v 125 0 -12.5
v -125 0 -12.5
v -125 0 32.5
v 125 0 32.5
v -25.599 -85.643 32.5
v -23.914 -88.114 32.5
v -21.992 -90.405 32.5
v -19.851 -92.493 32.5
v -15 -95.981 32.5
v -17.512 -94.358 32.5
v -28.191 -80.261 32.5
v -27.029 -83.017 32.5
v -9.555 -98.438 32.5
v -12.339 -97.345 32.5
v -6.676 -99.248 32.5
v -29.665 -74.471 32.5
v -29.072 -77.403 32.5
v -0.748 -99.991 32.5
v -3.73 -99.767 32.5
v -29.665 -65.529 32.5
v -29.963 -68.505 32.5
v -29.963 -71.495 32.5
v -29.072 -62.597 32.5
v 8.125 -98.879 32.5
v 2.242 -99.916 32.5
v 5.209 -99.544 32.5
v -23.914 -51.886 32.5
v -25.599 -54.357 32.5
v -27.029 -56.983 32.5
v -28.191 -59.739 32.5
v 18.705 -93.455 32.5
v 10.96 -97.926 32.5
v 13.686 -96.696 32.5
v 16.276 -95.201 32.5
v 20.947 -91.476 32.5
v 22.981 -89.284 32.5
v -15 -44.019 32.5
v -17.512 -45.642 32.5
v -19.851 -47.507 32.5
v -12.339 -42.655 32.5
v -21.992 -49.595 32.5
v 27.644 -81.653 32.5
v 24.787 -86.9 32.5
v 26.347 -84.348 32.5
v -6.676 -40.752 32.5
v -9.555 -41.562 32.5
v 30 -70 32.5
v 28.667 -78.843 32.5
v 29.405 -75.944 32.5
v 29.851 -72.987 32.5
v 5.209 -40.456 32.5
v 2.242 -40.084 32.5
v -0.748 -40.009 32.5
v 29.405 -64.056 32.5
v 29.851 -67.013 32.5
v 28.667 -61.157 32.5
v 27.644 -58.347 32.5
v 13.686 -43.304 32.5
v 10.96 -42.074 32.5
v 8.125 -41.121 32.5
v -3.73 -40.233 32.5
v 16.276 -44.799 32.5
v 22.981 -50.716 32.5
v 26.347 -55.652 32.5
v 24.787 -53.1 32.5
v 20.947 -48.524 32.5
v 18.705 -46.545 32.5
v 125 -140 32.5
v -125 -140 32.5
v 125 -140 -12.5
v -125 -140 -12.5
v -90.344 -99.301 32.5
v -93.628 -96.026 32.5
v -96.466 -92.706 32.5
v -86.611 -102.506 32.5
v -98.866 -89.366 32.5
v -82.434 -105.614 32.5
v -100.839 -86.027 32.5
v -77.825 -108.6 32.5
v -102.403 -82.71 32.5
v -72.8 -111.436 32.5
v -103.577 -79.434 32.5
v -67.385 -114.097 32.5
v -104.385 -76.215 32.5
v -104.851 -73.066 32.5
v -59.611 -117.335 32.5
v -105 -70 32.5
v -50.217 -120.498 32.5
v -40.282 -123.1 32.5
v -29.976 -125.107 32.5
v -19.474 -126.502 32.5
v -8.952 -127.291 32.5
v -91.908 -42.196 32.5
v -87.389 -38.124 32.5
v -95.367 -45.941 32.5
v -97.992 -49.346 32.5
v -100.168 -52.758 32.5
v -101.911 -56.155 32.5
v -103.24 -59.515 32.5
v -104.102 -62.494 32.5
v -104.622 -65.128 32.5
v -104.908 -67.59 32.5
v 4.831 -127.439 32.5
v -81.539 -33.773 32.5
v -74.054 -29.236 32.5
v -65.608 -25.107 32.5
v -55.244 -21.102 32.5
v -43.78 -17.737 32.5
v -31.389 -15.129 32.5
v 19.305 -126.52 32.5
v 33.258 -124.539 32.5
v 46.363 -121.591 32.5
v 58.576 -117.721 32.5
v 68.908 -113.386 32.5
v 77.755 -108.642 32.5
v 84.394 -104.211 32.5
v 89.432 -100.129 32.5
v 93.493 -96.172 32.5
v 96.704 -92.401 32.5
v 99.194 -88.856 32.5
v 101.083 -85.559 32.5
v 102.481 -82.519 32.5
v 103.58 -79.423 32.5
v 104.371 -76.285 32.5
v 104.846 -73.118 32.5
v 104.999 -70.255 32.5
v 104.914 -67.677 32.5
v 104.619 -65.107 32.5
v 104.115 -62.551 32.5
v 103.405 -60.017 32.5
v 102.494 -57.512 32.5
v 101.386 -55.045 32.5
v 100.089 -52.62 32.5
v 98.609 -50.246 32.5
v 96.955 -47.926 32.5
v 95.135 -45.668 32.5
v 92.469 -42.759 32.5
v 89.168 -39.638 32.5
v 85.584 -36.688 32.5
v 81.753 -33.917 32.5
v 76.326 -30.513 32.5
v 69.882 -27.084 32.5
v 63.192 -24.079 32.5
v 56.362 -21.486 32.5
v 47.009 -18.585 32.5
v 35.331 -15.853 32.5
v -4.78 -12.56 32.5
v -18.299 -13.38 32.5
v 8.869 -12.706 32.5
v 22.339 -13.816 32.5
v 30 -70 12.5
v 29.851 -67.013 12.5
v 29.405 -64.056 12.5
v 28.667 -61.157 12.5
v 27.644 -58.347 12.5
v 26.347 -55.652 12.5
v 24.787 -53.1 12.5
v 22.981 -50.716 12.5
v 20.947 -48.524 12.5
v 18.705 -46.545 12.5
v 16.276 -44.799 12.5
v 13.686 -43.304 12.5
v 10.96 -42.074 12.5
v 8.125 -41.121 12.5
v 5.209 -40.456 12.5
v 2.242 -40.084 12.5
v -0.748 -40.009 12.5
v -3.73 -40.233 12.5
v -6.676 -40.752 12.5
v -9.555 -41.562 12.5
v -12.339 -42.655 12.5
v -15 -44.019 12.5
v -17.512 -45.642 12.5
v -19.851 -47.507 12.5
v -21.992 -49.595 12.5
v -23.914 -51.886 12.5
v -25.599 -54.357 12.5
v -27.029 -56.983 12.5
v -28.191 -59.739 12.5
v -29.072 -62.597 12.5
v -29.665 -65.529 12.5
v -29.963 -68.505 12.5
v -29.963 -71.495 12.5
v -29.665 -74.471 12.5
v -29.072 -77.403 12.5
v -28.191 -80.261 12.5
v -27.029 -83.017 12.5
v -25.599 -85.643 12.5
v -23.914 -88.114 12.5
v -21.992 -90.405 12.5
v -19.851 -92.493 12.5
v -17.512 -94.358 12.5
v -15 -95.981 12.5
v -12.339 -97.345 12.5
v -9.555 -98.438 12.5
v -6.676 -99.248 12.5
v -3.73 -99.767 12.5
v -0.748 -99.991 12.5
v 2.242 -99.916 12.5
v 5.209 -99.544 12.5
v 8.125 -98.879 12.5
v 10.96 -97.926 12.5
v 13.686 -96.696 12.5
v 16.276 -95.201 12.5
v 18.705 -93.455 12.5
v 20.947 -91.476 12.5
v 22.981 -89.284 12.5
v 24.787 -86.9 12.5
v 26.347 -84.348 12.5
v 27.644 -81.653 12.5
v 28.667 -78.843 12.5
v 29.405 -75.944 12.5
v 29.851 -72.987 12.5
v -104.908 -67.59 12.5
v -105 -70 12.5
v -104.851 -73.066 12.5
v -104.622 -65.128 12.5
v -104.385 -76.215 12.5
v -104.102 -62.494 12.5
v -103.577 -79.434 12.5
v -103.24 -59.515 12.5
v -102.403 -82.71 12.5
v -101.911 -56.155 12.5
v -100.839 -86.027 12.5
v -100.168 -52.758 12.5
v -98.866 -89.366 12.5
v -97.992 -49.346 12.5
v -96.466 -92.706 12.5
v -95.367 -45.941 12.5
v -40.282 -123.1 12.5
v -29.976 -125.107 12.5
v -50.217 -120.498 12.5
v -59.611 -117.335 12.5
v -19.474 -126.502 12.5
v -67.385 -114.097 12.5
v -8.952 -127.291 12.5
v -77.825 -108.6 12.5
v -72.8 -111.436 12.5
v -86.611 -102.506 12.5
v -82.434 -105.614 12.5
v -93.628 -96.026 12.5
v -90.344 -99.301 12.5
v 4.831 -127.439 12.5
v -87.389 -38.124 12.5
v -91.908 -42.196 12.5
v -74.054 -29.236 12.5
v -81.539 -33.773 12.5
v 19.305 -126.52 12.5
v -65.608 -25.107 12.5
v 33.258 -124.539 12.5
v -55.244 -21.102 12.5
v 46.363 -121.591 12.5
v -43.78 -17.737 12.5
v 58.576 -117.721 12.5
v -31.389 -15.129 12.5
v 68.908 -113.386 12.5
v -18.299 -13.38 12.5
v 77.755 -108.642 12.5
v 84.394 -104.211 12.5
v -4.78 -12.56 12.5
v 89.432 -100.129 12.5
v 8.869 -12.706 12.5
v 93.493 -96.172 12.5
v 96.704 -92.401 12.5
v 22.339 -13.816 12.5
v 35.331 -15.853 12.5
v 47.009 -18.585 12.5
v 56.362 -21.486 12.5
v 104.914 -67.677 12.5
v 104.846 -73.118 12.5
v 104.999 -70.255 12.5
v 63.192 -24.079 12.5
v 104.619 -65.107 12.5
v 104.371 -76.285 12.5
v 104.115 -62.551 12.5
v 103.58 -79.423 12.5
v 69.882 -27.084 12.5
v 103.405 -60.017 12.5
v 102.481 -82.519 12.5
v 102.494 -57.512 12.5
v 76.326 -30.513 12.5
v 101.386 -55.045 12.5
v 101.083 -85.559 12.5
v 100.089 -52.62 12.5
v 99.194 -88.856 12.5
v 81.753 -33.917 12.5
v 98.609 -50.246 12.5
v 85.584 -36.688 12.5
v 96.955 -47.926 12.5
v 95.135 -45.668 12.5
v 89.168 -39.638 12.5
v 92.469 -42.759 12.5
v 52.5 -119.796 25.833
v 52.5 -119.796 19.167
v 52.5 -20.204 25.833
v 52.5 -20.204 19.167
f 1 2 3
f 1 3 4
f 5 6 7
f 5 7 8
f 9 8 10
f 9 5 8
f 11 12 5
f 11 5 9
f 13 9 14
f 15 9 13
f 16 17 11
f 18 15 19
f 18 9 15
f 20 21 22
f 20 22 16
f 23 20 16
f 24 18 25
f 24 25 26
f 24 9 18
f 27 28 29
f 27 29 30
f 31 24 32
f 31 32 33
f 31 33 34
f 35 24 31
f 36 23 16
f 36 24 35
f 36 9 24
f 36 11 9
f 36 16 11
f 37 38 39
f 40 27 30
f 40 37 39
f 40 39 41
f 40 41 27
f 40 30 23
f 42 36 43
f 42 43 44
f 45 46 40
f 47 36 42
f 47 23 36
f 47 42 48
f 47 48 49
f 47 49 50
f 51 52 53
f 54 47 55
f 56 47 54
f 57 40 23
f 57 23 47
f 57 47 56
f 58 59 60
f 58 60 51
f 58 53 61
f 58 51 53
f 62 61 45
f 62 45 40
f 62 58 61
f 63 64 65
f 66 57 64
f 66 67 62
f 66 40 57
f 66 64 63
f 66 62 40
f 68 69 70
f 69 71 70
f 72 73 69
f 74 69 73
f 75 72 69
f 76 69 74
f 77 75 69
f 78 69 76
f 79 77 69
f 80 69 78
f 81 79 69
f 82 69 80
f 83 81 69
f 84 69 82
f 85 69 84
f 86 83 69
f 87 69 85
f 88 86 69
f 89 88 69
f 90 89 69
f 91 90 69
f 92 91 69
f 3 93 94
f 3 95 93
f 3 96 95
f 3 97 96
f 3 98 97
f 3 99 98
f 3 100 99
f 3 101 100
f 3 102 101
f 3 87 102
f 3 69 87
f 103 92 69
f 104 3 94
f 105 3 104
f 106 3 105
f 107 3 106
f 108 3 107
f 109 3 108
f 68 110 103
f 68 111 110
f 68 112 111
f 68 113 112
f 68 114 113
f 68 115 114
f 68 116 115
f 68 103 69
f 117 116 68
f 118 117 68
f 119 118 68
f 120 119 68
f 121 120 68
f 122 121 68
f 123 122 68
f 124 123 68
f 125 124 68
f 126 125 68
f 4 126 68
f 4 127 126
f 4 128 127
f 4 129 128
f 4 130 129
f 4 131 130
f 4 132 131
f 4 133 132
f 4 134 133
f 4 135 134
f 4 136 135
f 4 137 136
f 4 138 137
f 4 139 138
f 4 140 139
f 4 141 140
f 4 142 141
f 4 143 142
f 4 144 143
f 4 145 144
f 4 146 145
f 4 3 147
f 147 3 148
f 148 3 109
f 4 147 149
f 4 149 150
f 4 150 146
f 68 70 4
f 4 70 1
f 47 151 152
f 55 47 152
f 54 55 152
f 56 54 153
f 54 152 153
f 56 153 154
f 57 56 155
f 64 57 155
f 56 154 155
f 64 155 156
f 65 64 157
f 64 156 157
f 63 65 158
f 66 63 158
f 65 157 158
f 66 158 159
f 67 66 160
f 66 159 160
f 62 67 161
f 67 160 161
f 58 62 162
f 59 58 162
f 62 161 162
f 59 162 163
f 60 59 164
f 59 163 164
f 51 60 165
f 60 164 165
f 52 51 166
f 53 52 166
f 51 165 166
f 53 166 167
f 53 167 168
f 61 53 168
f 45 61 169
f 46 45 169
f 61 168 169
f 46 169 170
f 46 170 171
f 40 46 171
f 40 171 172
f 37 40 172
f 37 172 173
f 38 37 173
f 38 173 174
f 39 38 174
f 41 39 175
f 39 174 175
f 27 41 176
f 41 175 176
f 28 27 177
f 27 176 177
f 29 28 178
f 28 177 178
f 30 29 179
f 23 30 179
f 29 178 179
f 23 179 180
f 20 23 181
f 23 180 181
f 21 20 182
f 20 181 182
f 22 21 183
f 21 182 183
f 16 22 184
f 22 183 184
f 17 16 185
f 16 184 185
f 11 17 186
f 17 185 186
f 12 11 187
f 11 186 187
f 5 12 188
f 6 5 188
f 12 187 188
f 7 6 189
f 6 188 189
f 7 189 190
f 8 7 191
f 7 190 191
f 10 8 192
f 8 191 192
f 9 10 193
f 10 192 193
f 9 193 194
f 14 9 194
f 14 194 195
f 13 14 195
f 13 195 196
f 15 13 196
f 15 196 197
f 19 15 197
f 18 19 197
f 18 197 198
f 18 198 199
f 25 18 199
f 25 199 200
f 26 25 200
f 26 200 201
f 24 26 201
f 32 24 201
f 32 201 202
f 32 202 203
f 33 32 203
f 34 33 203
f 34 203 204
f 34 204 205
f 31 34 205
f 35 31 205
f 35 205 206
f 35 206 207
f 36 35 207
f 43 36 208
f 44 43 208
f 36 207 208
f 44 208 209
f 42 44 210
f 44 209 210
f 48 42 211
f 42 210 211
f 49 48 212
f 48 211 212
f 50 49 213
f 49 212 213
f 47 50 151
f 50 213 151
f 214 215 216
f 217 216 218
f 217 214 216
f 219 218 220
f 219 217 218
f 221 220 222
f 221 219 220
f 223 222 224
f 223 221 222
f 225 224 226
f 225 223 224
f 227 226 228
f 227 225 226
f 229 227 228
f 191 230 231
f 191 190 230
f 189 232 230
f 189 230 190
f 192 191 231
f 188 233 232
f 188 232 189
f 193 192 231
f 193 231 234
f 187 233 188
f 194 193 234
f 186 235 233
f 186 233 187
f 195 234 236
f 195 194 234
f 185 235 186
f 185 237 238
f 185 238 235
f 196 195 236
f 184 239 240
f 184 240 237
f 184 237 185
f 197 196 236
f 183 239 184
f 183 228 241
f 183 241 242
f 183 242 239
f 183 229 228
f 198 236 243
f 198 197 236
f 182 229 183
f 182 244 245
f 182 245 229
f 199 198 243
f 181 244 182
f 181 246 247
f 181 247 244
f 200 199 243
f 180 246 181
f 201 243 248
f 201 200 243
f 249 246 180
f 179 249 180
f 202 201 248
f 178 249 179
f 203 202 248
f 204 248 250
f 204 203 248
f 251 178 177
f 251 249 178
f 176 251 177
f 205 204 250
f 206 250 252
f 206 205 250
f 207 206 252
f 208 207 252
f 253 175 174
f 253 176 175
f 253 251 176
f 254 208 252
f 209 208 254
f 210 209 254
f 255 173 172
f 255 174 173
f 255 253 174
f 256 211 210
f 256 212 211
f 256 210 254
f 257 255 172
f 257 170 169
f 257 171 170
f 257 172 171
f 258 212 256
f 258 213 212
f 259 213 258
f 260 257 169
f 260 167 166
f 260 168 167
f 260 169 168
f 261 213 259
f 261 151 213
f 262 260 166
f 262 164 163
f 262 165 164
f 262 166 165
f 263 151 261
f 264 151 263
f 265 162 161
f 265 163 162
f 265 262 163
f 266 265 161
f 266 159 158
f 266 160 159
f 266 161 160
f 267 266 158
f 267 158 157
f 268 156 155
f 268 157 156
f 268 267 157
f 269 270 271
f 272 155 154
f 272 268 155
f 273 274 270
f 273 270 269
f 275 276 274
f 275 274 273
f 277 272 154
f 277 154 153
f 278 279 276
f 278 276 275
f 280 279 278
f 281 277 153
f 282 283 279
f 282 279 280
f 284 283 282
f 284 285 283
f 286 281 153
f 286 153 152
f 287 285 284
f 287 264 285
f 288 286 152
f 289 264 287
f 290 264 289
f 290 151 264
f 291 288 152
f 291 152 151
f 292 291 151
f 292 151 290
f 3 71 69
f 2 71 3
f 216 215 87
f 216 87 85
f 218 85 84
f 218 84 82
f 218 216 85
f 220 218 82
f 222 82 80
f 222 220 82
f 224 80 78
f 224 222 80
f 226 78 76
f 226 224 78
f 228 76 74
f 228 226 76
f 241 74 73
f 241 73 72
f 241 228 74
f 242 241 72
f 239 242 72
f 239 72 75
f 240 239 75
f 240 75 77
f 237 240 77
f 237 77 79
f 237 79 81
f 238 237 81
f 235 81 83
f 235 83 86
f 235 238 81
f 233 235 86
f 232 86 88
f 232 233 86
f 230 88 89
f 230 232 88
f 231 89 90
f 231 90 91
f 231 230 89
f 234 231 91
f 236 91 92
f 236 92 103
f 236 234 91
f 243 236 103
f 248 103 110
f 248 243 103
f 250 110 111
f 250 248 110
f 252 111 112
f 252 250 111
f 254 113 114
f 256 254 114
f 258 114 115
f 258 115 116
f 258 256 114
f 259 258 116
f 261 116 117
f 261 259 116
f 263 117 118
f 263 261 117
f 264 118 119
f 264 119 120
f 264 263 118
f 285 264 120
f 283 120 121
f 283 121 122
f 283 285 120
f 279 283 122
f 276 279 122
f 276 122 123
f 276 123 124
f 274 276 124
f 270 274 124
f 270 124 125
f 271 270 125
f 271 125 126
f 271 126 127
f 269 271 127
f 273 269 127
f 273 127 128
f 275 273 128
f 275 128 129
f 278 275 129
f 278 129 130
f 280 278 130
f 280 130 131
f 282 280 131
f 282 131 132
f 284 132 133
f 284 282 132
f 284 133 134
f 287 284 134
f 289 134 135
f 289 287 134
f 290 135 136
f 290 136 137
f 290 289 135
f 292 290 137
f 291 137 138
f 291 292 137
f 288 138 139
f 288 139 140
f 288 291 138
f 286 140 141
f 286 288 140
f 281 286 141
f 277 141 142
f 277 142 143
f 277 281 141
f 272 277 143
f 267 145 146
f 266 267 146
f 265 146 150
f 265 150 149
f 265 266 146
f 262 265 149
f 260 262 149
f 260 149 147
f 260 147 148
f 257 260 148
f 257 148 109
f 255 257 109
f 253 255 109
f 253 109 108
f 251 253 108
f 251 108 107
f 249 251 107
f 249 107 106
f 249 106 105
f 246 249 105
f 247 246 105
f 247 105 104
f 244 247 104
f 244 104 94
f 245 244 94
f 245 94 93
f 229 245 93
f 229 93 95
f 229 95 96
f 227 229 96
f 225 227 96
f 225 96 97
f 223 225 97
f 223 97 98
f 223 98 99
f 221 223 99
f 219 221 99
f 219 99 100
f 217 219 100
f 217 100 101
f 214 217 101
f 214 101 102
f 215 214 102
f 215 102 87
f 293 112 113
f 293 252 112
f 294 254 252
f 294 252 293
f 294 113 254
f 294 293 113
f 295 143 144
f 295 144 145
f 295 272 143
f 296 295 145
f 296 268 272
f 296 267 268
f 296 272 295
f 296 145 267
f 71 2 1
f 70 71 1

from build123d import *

# Parameters (mm, degrees)
F0_W     = 250
F0_H     = 25
F1_DEPTH = 140
F2_W     = 250
F2_H     = 140
F2_R     = 30
F3_DEPTH = 20


with BuildPart() as f1:
    # F0 (on Front) → F1 (new body)
    with BuildSketch(Plane.XZ):
        Rectangle(F0_W, F0_H)
    extrude(amount=F1_DEPTH)

    # F2 (on face) → F3 (join)
    with BuildSketch(Plane.XY.offset(12.5)):
        with Locations((0, -70)):
            Rectangle(F2_W, F2_H)
        with BuildLine():
            add(Edge.make_bspline(
                [(-105, -70), (-105, -169.592921), (52.5, -119.796461), (210, -70), (52.5, -20.203539), (-105, 29.592921), (-105, -70)],
                knots=[0, 0, 0, 2.094395, 2.094395, 4.18879, 4.18879, 6.283185, 6.283185, 6.283185], degree=2, weights=[1, 0.5, 1, 0.5, 1, 0.5, 1]))
        make_face(mode=Mode.SUBTRACT)
        with Locations((0, -70)):
            Circle(F2_R)
    extrude(amount=F3_DEPTH)


solid = f1.part
